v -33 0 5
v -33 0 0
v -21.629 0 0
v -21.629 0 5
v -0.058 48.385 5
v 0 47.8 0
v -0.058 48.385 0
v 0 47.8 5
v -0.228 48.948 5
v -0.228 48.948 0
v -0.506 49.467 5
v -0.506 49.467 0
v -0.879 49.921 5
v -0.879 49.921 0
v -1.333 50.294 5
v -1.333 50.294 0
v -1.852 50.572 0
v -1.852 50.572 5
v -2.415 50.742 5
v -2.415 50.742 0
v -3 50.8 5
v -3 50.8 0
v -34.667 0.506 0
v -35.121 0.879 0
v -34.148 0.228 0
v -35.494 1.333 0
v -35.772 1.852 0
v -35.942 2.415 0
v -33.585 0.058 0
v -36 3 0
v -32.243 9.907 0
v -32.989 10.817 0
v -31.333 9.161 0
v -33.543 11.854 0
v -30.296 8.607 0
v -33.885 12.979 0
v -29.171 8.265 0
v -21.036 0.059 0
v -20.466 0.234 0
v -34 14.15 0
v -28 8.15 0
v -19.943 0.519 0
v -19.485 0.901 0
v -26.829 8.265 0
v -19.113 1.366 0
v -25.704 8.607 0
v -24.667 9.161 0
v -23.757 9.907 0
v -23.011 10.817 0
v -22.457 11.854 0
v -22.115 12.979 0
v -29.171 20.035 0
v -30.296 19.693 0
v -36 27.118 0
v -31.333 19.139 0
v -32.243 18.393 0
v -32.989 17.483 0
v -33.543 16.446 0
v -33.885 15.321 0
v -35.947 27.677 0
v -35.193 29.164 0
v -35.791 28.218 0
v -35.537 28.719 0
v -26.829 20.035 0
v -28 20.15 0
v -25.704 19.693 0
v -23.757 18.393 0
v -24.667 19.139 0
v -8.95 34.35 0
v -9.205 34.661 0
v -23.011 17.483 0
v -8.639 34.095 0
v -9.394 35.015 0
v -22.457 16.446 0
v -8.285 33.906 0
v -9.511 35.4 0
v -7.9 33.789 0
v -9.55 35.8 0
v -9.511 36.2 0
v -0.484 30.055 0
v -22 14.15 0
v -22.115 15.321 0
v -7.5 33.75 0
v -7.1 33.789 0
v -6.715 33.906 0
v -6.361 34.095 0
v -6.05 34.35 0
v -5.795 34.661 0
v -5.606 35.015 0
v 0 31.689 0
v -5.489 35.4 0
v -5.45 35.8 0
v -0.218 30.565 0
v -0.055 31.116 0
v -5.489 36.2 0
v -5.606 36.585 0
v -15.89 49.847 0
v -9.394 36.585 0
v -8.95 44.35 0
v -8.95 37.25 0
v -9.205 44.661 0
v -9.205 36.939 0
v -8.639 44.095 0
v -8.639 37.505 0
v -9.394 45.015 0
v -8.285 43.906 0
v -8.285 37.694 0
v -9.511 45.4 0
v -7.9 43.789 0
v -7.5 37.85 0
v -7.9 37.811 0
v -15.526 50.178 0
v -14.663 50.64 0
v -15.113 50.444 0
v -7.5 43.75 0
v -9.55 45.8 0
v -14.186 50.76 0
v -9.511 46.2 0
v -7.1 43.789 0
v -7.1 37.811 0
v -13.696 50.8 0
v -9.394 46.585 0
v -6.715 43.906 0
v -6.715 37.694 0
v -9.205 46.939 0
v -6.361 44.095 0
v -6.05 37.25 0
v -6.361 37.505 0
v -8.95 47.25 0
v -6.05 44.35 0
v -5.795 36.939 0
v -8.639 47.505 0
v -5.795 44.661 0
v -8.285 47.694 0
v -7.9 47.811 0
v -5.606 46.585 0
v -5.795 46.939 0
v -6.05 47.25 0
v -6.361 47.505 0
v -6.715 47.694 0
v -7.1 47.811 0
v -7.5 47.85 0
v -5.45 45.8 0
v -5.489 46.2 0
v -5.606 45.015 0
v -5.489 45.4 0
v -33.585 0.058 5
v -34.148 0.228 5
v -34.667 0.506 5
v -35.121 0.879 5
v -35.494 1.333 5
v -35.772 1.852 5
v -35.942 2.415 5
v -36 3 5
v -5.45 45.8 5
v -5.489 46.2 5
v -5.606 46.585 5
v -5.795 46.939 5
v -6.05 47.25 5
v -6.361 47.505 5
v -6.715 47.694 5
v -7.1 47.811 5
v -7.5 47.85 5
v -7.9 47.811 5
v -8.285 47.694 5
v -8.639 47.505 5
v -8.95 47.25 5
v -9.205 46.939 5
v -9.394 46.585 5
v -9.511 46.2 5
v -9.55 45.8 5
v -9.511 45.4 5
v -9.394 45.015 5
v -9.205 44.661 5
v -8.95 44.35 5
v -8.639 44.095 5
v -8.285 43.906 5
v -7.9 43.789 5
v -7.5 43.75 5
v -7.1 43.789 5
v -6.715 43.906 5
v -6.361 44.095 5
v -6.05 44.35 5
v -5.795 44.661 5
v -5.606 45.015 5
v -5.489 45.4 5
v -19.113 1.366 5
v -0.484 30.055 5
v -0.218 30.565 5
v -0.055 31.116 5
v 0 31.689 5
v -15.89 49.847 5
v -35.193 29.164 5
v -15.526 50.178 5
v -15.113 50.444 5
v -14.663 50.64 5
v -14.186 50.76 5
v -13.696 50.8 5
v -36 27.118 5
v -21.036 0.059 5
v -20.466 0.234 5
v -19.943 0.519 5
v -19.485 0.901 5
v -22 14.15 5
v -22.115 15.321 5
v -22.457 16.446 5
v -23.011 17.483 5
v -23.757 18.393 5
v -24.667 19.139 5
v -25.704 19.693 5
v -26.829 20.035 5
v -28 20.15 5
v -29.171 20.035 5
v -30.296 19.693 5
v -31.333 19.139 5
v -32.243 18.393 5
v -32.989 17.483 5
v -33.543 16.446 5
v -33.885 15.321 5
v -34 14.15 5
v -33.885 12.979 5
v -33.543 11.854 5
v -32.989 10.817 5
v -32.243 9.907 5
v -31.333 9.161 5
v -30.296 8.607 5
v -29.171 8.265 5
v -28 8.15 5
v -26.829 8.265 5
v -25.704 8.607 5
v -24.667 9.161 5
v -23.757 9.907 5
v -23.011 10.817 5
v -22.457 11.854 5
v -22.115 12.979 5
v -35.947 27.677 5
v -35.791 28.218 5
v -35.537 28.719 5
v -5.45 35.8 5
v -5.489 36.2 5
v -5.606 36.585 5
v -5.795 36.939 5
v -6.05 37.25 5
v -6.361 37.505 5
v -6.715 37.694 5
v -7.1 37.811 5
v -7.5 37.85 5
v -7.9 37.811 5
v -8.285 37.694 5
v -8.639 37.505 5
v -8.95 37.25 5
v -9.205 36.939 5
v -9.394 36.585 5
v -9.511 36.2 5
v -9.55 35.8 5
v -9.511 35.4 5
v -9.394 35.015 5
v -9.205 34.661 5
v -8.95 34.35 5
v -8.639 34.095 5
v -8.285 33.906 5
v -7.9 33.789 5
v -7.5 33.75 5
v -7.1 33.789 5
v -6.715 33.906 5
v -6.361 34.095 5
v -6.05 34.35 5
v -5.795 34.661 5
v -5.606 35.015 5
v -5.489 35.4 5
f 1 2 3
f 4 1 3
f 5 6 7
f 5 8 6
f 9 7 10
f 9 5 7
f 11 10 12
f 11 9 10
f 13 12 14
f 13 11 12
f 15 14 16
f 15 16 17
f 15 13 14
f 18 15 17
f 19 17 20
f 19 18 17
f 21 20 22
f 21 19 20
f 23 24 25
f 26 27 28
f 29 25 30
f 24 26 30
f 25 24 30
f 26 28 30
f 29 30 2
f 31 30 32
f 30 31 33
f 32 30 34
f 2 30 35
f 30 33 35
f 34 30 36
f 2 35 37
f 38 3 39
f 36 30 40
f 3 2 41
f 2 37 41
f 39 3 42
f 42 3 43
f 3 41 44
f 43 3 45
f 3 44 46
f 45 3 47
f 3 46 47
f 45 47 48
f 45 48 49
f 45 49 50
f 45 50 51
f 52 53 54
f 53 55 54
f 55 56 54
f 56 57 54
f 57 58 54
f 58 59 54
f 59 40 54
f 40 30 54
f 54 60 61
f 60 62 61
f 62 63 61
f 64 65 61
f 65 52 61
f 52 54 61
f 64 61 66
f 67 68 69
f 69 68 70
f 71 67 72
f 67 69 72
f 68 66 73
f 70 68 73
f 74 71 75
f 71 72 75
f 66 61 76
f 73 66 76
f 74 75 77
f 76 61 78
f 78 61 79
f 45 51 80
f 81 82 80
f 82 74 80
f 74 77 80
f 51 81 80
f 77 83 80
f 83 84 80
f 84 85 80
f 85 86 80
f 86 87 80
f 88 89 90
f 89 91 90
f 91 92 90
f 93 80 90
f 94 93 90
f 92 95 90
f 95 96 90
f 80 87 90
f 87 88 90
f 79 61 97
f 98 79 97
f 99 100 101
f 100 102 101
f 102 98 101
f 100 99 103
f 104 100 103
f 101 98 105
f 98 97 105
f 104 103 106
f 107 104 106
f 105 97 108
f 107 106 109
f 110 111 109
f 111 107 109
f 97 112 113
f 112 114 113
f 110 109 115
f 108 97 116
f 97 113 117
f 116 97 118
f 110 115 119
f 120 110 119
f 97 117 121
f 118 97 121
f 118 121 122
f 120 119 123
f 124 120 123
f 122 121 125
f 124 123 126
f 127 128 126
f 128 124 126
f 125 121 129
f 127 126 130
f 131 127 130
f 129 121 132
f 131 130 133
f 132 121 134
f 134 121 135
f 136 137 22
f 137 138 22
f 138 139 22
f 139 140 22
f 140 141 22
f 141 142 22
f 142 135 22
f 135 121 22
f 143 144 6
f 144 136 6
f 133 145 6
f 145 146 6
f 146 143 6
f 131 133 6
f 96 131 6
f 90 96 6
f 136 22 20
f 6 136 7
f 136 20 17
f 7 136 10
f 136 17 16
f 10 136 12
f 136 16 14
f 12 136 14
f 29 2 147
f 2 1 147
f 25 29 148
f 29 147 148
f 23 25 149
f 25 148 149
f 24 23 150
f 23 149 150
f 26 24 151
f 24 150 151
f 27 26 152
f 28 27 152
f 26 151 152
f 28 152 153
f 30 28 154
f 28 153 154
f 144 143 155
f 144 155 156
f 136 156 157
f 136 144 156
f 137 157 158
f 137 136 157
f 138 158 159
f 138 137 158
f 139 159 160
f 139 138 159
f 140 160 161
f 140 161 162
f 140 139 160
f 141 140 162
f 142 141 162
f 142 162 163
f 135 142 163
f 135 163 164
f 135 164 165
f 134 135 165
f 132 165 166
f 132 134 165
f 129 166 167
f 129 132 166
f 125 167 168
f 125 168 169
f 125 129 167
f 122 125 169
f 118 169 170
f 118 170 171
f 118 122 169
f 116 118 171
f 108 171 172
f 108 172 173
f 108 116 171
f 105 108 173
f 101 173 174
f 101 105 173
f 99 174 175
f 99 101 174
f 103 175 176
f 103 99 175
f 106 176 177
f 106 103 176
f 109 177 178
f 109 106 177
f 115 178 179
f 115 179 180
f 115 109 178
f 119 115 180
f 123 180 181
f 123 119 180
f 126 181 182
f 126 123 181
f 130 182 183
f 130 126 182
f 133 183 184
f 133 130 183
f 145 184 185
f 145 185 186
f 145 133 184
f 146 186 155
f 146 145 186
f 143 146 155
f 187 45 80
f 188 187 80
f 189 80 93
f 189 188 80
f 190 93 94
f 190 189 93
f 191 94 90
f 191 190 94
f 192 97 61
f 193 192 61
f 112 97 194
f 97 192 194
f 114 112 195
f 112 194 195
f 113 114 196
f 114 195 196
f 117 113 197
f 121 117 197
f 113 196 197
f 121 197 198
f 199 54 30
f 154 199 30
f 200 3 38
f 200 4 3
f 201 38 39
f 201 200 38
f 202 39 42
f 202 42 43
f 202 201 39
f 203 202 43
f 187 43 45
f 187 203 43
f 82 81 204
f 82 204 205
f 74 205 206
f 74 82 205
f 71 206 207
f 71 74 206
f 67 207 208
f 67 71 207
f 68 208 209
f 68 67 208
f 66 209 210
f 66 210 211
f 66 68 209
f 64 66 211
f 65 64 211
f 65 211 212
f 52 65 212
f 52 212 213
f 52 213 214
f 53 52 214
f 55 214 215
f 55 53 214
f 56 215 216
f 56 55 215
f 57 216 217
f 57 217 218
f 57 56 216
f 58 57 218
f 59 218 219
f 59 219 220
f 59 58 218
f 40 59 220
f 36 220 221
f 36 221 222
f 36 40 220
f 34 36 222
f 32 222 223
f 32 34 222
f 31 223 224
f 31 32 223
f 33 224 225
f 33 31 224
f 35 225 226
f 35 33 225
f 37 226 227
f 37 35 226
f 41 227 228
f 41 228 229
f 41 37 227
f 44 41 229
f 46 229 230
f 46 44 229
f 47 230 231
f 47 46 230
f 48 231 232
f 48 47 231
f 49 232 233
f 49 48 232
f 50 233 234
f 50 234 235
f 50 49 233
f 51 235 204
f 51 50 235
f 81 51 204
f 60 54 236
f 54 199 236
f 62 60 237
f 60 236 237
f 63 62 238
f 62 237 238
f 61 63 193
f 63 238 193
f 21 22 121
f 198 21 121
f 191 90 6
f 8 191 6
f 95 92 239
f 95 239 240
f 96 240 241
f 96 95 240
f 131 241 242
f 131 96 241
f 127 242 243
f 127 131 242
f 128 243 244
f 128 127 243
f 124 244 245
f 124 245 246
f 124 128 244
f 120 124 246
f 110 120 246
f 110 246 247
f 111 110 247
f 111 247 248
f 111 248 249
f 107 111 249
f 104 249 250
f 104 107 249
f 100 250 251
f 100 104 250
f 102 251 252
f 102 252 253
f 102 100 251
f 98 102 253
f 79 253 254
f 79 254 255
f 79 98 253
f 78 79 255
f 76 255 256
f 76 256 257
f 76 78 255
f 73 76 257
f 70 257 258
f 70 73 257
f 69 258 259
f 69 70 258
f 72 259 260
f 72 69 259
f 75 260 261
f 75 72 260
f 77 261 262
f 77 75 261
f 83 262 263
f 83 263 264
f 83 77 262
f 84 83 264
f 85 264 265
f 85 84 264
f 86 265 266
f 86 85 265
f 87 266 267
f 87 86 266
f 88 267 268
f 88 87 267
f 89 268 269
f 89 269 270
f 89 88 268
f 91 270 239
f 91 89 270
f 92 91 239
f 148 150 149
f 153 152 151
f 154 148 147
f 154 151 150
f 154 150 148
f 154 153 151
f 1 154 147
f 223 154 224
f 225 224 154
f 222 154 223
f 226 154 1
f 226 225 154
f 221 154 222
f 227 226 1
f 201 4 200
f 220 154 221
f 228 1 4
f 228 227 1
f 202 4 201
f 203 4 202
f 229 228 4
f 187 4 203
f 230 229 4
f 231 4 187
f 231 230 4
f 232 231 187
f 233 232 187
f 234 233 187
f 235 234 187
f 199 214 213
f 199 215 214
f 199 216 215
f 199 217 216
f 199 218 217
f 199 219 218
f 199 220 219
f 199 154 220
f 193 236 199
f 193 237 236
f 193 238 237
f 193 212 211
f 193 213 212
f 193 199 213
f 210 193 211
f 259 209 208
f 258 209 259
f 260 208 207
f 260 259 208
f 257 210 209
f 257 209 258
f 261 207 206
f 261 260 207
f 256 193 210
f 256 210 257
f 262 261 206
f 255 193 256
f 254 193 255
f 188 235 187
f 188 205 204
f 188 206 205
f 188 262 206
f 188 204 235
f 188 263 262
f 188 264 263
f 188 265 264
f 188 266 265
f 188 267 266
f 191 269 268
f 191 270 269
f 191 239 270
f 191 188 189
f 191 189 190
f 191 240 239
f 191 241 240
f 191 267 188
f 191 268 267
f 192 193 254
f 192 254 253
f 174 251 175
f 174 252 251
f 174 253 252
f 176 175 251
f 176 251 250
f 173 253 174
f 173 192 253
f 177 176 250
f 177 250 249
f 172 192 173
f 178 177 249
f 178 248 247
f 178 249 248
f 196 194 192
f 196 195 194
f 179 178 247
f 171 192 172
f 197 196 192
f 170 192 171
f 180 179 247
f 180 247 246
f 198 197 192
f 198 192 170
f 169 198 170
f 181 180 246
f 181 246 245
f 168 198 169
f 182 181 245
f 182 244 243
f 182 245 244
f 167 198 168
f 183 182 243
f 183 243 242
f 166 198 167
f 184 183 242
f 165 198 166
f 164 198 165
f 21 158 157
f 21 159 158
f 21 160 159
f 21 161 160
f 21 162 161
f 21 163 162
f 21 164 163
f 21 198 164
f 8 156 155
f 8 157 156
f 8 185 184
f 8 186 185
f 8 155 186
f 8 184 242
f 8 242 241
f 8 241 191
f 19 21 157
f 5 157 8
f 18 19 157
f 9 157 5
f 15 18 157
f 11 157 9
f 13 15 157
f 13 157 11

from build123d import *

# Parameters (mm, degrees)
SKETCH_1_R      = 6
SKETCH_1_R_2    = 2.05
EXTRUDE_1_DEPTH = 5
FILLET_1_R      = 3


with BuildPart() as part:
    # ｽｹｯﾁ1 → ﾎﾞｽ - 押し出し1 (new body)
    with BuildSketch(Plane.XY):
        Polygon((-36, 0), (-20, 0), (0, 30.8), (0, 50.8), (-15, 50.8), (-36, 28.3), align=None)
        with Locations((-28, 14.15)):
            Circle(SKETCH_1_R, mode=Mode.SUBTRACT)
        with Locations((-7.5, 35.8)):
            Circle(SKETCH_1_R_2, mode=Mode.SUBTRACT)
        with Locations((-7.5, 45.8)):
            Circle(SKETCH_1_R_2, mode=Mode.SUBTRACT)
    extrude(amount=EXTRUDE_1_DEPTH)

    # ﾌｨﾚｯﾄ1
    fillet_1_edges = [part.edges().sort_by_distance(p)[0] for p in [
        (-15, 50.8, 2.5),
        (0, 50.8, 2.5),
        (0, 30.8, 2.5),
        (-20, 0, 2.5),
        (-36, 0, 2.5),
        (-36, 28.3, 2.5),
    ]]
    fillet(fillet_1_edges, radius=FILLET_1_R)


solid = part.part
